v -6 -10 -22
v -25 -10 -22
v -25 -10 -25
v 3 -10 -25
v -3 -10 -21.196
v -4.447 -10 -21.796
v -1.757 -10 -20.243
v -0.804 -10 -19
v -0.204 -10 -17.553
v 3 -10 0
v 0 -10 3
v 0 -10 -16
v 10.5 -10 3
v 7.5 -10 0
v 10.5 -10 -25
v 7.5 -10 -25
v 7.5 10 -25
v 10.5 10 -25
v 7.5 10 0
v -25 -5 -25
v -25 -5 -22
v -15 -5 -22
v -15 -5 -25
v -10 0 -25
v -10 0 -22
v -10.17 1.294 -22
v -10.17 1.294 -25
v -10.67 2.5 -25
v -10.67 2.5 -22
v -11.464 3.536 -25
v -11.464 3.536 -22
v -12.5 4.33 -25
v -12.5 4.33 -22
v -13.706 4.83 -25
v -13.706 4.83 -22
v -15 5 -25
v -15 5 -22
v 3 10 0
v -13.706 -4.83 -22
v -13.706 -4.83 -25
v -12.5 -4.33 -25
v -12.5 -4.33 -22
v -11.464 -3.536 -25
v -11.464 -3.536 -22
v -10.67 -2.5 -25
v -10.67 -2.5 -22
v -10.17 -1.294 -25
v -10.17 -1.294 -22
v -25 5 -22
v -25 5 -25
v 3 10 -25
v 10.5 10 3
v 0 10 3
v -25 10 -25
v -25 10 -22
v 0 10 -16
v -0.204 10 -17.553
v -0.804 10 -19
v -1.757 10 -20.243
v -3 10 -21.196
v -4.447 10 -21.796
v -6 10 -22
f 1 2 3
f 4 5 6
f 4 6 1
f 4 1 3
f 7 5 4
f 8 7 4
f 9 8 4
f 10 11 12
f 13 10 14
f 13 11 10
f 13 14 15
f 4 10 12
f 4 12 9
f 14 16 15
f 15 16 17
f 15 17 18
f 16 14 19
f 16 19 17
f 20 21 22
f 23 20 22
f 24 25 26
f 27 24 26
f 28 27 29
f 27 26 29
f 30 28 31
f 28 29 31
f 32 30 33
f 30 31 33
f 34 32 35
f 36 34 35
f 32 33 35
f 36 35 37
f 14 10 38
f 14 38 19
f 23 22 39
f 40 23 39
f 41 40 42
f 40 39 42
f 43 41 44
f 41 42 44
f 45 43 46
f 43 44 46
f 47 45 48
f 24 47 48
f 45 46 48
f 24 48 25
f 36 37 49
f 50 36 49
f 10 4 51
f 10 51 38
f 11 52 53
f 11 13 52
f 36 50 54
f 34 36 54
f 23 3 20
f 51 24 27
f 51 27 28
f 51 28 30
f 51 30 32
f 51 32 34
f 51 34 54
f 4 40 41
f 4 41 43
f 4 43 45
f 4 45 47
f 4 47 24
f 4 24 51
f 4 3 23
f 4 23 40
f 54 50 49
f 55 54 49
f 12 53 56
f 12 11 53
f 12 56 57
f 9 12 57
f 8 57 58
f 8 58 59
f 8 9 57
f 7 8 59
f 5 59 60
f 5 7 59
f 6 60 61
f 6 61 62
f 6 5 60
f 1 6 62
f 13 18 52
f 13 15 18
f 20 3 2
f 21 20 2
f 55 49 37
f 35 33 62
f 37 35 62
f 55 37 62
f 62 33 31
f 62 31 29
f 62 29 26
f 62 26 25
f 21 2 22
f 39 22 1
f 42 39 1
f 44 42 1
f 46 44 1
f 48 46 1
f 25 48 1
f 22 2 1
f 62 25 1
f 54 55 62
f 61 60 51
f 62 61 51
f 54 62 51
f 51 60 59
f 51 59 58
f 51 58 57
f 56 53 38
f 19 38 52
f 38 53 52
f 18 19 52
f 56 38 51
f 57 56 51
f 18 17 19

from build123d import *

# Parameters (mm, degrees)
F0_W          = 3
F0_H          = 3
F0_W_2        = 4.5
F0_W_3        = 25
F1_DEPTH      = 10
F1_DEPTH_BACK = 10
F4_DEPTH      = 10
F4_DEPTH_BACK = 10
F5_R          = 6


with BuildPart() as f1:
    # F0 (on Front) → F1 (new body, two sides)
    with BuildSketch(Plane.XZ) as f1_sk:
        with Locations((1.5, 1.5)):
            Rectangle(F0_W, F0_H)
        Polygon((3, 0), (0, 0), (0, -22), (0, -25), (3, -25), align=None)
        with Locations((5.25, 1.5)):
            Rectangle(F0_W_2, F0_H)
        with Locations((-12.5, -23.5)):
            Rectangle(F0_W_3, F0_H)
        Polygon((7.5, 3), (7.5, 0), (7.5, -25), (10.5, -25), (10.5, 3), align=None)
    extrude(amount=F1_DEPTH)
    extrude(f1_sk.sketch, amount=-F1_DEPTH_BACK)

    # F3 (on offset) → F4 (cut, two sides)
    with BuildSketch(Plane.XY.offset(-20)) as f4_sk:
        with BuildLine():
            ThreePointArc((-15, -5), (-11.464466, -3.535534), (-10, 0))
            Line((-10, 0), (-25, 0))
            Line((-25, 0), (-25, -5))
            Line((-25, -5), (-15, -5))
        make_face()
        with BuildLine():
            Line((-25, 0), (-10, 0))
            ThreePointArc((-10, 0), (-11.464466, 3.535534), (-15, 5))
            Line((-15, 5), (-25, 5))
            Line((-25, 5), (-25, 0))
        make_face()
    extrude(amount=F4_DEPTH, mode=Mode.SUBTRACT)
    extrude(f4_sk.sketch, amount=-F4_DEPTH_BACK, mode=Mode.SUBTRACT)

    # F5
    f5_edges = [f1.edges().sort_by_distance(p)[0] for p in [
        (0, 0, -22),
    ]]
    fillet(f5_edges, radius=F5_R)


solid = f1.part
